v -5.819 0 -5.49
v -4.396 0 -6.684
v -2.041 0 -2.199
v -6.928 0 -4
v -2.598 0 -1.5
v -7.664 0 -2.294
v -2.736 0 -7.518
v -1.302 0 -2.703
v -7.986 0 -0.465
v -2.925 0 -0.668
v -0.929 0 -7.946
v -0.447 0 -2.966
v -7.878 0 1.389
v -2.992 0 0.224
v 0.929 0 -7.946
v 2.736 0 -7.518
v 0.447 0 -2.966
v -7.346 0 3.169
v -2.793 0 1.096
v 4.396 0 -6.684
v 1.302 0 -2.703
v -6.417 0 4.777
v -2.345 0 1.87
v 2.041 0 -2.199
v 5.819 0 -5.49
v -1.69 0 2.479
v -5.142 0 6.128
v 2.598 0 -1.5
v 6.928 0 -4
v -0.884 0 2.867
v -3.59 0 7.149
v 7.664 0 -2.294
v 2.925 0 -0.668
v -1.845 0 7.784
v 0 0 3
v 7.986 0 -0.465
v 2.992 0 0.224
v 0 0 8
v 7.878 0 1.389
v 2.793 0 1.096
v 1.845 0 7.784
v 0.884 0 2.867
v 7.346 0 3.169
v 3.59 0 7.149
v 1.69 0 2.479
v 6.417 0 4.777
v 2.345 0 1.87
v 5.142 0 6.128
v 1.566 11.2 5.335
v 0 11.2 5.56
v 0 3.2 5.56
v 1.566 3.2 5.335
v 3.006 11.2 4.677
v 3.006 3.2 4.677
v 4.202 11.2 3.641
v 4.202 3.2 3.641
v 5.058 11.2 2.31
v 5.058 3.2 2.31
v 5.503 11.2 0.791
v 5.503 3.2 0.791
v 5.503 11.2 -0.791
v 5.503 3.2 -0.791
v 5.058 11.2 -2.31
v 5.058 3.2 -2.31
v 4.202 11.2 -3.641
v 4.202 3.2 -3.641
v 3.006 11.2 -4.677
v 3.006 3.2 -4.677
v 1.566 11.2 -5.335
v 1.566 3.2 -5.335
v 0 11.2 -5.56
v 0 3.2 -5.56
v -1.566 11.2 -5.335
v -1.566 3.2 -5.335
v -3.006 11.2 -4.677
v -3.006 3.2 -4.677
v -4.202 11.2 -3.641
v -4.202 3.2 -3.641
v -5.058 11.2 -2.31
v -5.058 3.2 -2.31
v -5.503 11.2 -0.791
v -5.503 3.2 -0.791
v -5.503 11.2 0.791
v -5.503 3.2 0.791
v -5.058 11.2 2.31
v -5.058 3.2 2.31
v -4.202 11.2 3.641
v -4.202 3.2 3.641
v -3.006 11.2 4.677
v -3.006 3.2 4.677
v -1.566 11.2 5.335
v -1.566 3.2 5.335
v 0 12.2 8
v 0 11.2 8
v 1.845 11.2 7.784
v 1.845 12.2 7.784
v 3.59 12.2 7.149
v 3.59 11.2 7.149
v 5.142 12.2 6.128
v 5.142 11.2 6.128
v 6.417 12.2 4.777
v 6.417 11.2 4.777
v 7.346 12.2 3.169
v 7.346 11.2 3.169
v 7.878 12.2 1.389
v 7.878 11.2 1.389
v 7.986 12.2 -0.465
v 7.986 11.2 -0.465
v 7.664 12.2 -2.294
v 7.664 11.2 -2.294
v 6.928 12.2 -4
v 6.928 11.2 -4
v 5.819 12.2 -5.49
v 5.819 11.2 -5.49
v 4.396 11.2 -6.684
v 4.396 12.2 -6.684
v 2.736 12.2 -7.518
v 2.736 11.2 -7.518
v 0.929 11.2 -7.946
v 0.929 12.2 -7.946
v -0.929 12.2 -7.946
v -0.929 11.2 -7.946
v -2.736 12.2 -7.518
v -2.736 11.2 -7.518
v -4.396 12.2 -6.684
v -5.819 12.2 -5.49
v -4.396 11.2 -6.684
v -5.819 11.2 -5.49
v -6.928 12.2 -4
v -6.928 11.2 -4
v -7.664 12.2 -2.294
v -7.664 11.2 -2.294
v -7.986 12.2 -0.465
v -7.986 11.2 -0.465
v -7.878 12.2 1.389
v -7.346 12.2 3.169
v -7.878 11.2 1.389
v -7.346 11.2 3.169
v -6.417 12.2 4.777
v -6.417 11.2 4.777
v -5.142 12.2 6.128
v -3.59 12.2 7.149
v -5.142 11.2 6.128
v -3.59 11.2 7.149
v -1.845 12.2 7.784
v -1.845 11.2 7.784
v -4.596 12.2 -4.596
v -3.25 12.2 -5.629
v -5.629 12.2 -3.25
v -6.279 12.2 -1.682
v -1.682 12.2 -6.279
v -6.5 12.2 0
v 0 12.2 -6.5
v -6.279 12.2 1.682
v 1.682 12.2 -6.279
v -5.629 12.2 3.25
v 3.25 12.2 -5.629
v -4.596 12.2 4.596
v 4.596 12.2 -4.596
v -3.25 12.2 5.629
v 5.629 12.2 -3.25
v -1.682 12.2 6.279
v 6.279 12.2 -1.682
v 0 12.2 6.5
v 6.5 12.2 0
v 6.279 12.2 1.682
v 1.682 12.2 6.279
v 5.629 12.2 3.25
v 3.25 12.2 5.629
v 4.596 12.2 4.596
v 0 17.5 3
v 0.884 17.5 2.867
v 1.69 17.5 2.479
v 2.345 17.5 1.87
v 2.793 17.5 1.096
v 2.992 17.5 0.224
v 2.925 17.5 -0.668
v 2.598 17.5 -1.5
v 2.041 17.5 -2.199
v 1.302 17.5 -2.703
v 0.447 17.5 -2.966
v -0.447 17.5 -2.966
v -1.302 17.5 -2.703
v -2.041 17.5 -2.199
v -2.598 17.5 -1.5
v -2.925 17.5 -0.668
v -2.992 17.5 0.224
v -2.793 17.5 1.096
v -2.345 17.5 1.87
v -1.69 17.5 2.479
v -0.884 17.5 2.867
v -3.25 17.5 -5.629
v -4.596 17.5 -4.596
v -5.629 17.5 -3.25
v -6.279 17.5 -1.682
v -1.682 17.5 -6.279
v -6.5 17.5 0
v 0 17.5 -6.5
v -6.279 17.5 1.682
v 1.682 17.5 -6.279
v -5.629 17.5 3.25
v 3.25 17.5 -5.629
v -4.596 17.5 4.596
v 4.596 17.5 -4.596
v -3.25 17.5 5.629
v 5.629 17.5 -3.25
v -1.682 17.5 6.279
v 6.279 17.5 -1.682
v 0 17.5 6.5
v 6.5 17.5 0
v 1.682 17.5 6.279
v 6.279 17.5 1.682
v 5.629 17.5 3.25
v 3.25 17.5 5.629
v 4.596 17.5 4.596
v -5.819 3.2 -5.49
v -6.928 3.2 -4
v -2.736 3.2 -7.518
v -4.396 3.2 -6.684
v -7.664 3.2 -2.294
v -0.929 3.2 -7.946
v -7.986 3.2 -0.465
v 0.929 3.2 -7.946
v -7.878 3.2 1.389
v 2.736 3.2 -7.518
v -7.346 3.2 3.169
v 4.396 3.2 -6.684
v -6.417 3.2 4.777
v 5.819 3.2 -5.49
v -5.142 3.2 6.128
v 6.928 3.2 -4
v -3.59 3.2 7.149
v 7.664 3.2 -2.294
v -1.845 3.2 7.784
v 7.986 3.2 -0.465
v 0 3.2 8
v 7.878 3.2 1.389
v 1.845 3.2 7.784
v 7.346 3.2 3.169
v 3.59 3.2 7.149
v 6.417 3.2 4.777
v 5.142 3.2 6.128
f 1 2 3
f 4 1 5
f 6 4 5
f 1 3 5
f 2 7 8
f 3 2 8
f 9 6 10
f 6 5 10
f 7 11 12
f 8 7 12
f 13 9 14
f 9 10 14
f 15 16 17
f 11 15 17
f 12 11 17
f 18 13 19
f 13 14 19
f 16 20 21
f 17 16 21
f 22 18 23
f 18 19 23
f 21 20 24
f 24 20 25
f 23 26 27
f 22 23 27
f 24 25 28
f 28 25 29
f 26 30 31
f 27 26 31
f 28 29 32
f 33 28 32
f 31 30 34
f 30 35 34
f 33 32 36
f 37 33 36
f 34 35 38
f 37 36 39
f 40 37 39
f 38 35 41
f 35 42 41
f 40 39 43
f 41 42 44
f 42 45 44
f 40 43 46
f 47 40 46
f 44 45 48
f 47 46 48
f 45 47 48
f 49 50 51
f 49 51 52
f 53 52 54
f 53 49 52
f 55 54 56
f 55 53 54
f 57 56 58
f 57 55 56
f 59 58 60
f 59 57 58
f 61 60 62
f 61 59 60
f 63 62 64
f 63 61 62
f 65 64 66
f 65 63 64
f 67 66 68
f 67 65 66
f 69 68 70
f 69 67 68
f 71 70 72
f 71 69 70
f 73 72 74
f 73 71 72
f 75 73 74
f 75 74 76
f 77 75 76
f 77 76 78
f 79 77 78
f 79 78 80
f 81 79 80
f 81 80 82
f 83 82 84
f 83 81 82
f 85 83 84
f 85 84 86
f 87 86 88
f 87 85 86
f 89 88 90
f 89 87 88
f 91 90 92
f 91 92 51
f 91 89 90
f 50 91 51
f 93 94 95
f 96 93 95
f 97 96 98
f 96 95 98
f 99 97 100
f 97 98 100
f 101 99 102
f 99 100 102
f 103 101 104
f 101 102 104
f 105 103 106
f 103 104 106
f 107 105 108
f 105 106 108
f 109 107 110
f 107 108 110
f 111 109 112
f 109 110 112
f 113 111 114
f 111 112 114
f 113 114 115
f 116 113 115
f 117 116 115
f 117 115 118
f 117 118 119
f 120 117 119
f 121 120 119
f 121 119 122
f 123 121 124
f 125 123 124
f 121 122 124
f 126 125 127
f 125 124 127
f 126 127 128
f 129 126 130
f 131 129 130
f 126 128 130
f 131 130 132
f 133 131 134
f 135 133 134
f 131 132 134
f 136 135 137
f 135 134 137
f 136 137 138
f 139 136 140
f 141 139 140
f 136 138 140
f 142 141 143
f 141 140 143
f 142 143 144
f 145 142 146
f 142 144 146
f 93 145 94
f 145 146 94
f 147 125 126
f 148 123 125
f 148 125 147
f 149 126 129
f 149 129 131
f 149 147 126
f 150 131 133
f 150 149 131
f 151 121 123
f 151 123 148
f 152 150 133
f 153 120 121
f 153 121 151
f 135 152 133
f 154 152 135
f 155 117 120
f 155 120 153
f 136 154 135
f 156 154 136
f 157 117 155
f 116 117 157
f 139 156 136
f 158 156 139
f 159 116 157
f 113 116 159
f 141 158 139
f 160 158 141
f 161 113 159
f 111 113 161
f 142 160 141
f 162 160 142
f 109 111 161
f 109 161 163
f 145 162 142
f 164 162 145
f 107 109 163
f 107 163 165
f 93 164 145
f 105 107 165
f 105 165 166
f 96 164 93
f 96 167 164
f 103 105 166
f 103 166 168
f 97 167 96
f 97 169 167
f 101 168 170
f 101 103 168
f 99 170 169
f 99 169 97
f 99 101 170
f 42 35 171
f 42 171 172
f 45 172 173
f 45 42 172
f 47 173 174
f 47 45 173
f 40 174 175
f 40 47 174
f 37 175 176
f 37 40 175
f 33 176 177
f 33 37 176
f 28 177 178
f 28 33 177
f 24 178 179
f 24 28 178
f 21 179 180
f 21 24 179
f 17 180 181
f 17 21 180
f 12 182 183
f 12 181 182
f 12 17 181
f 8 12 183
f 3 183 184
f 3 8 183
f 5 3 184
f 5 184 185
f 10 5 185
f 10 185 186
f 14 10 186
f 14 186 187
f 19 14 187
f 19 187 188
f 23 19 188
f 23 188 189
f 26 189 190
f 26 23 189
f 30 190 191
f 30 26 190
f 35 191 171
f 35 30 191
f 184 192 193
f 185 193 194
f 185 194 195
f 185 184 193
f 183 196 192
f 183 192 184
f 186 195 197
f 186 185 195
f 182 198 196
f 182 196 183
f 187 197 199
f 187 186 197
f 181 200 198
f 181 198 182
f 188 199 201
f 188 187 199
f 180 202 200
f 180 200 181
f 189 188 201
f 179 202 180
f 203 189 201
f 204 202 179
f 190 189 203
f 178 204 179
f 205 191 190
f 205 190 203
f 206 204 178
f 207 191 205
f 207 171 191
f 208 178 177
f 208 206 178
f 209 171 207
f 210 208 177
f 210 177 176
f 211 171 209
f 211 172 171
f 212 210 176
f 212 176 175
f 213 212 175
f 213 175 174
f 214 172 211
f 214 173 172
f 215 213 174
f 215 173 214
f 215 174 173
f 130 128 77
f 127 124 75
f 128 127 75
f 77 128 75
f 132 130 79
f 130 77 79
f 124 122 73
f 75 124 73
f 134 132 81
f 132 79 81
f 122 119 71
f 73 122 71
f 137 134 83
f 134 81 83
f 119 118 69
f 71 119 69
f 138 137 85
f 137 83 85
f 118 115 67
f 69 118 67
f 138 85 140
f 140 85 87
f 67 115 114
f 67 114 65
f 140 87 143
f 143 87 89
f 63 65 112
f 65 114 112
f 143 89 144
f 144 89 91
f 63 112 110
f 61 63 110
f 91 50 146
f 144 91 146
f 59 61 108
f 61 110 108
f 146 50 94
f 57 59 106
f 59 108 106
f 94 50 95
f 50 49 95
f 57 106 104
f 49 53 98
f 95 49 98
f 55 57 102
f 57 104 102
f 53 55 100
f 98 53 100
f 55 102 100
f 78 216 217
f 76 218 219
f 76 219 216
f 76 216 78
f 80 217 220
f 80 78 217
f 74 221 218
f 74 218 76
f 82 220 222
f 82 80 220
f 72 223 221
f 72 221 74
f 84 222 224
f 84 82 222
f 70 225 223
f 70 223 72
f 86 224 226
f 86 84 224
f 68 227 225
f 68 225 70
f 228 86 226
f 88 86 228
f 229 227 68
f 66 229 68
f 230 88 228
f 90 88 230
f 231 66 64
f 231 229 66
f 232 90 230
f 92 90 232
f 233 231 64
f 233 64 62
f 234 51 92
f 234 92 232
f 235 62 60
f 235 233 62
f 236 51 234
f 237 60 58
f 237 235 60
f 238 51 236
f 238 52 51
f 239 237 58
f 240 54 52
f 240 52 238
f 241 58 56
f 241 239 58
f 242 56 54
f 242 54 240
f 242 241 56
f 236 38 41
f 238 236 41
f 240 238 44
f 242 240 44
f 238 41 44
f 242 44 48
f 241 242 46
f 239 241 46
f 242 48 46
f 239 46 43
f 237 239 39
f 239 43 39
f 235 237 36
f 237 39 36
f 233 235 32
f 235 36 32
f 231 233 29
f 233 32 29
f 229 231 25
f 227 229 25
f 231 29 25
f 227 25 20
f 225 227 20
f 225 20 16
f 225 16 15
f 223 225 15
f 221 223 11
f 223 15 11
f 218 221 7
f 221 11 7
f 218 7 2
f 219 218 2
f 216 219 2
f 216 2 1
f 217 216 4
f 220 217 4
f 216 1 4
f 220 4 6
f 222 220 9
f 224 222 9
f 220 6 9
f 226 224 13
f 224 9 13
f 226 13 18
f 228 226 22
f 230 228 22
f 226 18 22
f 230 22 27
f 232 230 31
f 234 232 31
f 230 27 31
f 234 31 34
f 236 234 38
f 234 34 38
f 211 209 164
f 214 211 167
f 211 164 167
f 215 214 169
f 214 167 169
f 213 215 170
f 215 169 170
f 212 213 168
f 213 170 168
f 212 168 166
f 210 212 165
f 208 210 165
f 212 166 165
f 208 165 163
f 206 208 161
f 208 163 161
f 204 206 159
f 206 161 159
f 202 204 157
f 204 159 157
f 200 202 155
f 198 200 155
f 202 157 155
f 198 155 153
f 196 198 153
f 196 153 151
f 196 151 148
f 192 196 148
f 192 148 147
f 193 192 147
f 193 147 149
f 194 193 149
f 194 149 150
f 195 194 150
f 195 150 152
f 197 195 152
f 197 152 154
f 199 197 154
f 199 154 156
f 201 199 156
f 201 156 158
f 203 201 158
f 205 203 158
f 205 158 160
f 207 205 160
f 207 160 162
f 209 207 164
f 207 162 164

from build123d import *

# Parameters (mm, degrees)
SKETCH1_R               = 6.5
BOSS_EXTRUDE1_DEPTH     = 17.5
SKETCH2_R               = 8.62249149
SKETCH2_R_2             = 5.56
CUT_EXTRUDE1_DEPTH      = 8
CUT_EXTRUDE2_DEPTH      = 20.767397401
CUT_EXTRUDE2_DEPTH_BACK = 20.767397401
SKETCH4_R               = 3
SKETCH5_R               = 8
SKETCH5_R_2             = 3.869185068
BOSS_EXTRUDE2_DEPTH     = 1
SKETCH6_R               = 8
SKETCH6_R_2             = 3
BOSS_EXTRUDE3_DEPTH     = 3.2


with BuildPart() as part:
    # Sketch1 → Boss-Extrude1 (new body)
    with BuildSketch(Plane(origin=(0, 0, 0), x_dir=(1, 0, 0), z_dir=(0, 1, 0))):
        with Locations(Location((0, 0, 0), (0, 0, 270))):
            Circle(SKETCH1_R)
    extrude(amount=BOSS_EXTRUDE1_DEPTH)

    # Sketch2 → Cut-Extrude1 (cut)
    with BuildSketch(Plane(origin=(0, 11.2, 0), x_dir=(1, 0, 0), z_dir=(0, 1, 0))):
        Circle(SKETCH2_R)
        with Locations(Location((0, 0, 0), (0, 0, 270))):
            Circle(SKETCH2_R_2, mode=Mode.SUBTRACT)
    extrude(amount=-CUT_EXTRUDE1_DEPTH, mode=Mode.SUBTRACT)

    # Sketch4 → Cut-Extrude2 (cut, two sides: drawn at the far end of the back side and taken through both)
    with BuildSketch(Plane(origin=(0, 17.5, 0), x_dir=(1, 0, 0), z_dir=(0, 1, 0)).offset(-CUT_EXTRUDE2_DEPTH_BACK)):
        with Locations(Location((0, 0, 0), (0, 0, 270))):
            Circle(SKETCH4_R)
    extrude(amount=CUT_EXTRUDE2_DEPTH + CUT_EXTRUDE2_DEPTH_BACK, mode=Mode.SUBTRACT)

    # Sketch5 → Boss-Extrude2 (add)
    with BuildSketch(Plane(origin=(0, 11.2, 0), x_dir=(1, 0, 0), z_dir=(0, 1, 0))):
        with Locations(Location((0, 0, 0), (0, 0, 270))):
            Circle(SKETCH5_R)
        Circle(SKETCH5_R_2, mode=Mode.SUBTRACT)
    extrude(amount=BOSS_EXTRUDE2_DEPTH)

    # Sketch6 → Boss-Extrude3 (add)
    with BuildSketch(Plane(origin=(0, 0, 0), x_dir=(1, 0, 0), z_dir=(0, 1, 0))):
        with Locations(Location((0, 0, 0), (0, 0, 270))):
            Circle(SKETCH6_R)
        with Locations(Location((0, 0, 0), (0, 0, 270))):
            Circle(SKETCH6_R_2, mode=Mode.SUBTRACT)
    extrude(amount=BOSS_EXTRUDE3_DEPTH)


solid = part.part
